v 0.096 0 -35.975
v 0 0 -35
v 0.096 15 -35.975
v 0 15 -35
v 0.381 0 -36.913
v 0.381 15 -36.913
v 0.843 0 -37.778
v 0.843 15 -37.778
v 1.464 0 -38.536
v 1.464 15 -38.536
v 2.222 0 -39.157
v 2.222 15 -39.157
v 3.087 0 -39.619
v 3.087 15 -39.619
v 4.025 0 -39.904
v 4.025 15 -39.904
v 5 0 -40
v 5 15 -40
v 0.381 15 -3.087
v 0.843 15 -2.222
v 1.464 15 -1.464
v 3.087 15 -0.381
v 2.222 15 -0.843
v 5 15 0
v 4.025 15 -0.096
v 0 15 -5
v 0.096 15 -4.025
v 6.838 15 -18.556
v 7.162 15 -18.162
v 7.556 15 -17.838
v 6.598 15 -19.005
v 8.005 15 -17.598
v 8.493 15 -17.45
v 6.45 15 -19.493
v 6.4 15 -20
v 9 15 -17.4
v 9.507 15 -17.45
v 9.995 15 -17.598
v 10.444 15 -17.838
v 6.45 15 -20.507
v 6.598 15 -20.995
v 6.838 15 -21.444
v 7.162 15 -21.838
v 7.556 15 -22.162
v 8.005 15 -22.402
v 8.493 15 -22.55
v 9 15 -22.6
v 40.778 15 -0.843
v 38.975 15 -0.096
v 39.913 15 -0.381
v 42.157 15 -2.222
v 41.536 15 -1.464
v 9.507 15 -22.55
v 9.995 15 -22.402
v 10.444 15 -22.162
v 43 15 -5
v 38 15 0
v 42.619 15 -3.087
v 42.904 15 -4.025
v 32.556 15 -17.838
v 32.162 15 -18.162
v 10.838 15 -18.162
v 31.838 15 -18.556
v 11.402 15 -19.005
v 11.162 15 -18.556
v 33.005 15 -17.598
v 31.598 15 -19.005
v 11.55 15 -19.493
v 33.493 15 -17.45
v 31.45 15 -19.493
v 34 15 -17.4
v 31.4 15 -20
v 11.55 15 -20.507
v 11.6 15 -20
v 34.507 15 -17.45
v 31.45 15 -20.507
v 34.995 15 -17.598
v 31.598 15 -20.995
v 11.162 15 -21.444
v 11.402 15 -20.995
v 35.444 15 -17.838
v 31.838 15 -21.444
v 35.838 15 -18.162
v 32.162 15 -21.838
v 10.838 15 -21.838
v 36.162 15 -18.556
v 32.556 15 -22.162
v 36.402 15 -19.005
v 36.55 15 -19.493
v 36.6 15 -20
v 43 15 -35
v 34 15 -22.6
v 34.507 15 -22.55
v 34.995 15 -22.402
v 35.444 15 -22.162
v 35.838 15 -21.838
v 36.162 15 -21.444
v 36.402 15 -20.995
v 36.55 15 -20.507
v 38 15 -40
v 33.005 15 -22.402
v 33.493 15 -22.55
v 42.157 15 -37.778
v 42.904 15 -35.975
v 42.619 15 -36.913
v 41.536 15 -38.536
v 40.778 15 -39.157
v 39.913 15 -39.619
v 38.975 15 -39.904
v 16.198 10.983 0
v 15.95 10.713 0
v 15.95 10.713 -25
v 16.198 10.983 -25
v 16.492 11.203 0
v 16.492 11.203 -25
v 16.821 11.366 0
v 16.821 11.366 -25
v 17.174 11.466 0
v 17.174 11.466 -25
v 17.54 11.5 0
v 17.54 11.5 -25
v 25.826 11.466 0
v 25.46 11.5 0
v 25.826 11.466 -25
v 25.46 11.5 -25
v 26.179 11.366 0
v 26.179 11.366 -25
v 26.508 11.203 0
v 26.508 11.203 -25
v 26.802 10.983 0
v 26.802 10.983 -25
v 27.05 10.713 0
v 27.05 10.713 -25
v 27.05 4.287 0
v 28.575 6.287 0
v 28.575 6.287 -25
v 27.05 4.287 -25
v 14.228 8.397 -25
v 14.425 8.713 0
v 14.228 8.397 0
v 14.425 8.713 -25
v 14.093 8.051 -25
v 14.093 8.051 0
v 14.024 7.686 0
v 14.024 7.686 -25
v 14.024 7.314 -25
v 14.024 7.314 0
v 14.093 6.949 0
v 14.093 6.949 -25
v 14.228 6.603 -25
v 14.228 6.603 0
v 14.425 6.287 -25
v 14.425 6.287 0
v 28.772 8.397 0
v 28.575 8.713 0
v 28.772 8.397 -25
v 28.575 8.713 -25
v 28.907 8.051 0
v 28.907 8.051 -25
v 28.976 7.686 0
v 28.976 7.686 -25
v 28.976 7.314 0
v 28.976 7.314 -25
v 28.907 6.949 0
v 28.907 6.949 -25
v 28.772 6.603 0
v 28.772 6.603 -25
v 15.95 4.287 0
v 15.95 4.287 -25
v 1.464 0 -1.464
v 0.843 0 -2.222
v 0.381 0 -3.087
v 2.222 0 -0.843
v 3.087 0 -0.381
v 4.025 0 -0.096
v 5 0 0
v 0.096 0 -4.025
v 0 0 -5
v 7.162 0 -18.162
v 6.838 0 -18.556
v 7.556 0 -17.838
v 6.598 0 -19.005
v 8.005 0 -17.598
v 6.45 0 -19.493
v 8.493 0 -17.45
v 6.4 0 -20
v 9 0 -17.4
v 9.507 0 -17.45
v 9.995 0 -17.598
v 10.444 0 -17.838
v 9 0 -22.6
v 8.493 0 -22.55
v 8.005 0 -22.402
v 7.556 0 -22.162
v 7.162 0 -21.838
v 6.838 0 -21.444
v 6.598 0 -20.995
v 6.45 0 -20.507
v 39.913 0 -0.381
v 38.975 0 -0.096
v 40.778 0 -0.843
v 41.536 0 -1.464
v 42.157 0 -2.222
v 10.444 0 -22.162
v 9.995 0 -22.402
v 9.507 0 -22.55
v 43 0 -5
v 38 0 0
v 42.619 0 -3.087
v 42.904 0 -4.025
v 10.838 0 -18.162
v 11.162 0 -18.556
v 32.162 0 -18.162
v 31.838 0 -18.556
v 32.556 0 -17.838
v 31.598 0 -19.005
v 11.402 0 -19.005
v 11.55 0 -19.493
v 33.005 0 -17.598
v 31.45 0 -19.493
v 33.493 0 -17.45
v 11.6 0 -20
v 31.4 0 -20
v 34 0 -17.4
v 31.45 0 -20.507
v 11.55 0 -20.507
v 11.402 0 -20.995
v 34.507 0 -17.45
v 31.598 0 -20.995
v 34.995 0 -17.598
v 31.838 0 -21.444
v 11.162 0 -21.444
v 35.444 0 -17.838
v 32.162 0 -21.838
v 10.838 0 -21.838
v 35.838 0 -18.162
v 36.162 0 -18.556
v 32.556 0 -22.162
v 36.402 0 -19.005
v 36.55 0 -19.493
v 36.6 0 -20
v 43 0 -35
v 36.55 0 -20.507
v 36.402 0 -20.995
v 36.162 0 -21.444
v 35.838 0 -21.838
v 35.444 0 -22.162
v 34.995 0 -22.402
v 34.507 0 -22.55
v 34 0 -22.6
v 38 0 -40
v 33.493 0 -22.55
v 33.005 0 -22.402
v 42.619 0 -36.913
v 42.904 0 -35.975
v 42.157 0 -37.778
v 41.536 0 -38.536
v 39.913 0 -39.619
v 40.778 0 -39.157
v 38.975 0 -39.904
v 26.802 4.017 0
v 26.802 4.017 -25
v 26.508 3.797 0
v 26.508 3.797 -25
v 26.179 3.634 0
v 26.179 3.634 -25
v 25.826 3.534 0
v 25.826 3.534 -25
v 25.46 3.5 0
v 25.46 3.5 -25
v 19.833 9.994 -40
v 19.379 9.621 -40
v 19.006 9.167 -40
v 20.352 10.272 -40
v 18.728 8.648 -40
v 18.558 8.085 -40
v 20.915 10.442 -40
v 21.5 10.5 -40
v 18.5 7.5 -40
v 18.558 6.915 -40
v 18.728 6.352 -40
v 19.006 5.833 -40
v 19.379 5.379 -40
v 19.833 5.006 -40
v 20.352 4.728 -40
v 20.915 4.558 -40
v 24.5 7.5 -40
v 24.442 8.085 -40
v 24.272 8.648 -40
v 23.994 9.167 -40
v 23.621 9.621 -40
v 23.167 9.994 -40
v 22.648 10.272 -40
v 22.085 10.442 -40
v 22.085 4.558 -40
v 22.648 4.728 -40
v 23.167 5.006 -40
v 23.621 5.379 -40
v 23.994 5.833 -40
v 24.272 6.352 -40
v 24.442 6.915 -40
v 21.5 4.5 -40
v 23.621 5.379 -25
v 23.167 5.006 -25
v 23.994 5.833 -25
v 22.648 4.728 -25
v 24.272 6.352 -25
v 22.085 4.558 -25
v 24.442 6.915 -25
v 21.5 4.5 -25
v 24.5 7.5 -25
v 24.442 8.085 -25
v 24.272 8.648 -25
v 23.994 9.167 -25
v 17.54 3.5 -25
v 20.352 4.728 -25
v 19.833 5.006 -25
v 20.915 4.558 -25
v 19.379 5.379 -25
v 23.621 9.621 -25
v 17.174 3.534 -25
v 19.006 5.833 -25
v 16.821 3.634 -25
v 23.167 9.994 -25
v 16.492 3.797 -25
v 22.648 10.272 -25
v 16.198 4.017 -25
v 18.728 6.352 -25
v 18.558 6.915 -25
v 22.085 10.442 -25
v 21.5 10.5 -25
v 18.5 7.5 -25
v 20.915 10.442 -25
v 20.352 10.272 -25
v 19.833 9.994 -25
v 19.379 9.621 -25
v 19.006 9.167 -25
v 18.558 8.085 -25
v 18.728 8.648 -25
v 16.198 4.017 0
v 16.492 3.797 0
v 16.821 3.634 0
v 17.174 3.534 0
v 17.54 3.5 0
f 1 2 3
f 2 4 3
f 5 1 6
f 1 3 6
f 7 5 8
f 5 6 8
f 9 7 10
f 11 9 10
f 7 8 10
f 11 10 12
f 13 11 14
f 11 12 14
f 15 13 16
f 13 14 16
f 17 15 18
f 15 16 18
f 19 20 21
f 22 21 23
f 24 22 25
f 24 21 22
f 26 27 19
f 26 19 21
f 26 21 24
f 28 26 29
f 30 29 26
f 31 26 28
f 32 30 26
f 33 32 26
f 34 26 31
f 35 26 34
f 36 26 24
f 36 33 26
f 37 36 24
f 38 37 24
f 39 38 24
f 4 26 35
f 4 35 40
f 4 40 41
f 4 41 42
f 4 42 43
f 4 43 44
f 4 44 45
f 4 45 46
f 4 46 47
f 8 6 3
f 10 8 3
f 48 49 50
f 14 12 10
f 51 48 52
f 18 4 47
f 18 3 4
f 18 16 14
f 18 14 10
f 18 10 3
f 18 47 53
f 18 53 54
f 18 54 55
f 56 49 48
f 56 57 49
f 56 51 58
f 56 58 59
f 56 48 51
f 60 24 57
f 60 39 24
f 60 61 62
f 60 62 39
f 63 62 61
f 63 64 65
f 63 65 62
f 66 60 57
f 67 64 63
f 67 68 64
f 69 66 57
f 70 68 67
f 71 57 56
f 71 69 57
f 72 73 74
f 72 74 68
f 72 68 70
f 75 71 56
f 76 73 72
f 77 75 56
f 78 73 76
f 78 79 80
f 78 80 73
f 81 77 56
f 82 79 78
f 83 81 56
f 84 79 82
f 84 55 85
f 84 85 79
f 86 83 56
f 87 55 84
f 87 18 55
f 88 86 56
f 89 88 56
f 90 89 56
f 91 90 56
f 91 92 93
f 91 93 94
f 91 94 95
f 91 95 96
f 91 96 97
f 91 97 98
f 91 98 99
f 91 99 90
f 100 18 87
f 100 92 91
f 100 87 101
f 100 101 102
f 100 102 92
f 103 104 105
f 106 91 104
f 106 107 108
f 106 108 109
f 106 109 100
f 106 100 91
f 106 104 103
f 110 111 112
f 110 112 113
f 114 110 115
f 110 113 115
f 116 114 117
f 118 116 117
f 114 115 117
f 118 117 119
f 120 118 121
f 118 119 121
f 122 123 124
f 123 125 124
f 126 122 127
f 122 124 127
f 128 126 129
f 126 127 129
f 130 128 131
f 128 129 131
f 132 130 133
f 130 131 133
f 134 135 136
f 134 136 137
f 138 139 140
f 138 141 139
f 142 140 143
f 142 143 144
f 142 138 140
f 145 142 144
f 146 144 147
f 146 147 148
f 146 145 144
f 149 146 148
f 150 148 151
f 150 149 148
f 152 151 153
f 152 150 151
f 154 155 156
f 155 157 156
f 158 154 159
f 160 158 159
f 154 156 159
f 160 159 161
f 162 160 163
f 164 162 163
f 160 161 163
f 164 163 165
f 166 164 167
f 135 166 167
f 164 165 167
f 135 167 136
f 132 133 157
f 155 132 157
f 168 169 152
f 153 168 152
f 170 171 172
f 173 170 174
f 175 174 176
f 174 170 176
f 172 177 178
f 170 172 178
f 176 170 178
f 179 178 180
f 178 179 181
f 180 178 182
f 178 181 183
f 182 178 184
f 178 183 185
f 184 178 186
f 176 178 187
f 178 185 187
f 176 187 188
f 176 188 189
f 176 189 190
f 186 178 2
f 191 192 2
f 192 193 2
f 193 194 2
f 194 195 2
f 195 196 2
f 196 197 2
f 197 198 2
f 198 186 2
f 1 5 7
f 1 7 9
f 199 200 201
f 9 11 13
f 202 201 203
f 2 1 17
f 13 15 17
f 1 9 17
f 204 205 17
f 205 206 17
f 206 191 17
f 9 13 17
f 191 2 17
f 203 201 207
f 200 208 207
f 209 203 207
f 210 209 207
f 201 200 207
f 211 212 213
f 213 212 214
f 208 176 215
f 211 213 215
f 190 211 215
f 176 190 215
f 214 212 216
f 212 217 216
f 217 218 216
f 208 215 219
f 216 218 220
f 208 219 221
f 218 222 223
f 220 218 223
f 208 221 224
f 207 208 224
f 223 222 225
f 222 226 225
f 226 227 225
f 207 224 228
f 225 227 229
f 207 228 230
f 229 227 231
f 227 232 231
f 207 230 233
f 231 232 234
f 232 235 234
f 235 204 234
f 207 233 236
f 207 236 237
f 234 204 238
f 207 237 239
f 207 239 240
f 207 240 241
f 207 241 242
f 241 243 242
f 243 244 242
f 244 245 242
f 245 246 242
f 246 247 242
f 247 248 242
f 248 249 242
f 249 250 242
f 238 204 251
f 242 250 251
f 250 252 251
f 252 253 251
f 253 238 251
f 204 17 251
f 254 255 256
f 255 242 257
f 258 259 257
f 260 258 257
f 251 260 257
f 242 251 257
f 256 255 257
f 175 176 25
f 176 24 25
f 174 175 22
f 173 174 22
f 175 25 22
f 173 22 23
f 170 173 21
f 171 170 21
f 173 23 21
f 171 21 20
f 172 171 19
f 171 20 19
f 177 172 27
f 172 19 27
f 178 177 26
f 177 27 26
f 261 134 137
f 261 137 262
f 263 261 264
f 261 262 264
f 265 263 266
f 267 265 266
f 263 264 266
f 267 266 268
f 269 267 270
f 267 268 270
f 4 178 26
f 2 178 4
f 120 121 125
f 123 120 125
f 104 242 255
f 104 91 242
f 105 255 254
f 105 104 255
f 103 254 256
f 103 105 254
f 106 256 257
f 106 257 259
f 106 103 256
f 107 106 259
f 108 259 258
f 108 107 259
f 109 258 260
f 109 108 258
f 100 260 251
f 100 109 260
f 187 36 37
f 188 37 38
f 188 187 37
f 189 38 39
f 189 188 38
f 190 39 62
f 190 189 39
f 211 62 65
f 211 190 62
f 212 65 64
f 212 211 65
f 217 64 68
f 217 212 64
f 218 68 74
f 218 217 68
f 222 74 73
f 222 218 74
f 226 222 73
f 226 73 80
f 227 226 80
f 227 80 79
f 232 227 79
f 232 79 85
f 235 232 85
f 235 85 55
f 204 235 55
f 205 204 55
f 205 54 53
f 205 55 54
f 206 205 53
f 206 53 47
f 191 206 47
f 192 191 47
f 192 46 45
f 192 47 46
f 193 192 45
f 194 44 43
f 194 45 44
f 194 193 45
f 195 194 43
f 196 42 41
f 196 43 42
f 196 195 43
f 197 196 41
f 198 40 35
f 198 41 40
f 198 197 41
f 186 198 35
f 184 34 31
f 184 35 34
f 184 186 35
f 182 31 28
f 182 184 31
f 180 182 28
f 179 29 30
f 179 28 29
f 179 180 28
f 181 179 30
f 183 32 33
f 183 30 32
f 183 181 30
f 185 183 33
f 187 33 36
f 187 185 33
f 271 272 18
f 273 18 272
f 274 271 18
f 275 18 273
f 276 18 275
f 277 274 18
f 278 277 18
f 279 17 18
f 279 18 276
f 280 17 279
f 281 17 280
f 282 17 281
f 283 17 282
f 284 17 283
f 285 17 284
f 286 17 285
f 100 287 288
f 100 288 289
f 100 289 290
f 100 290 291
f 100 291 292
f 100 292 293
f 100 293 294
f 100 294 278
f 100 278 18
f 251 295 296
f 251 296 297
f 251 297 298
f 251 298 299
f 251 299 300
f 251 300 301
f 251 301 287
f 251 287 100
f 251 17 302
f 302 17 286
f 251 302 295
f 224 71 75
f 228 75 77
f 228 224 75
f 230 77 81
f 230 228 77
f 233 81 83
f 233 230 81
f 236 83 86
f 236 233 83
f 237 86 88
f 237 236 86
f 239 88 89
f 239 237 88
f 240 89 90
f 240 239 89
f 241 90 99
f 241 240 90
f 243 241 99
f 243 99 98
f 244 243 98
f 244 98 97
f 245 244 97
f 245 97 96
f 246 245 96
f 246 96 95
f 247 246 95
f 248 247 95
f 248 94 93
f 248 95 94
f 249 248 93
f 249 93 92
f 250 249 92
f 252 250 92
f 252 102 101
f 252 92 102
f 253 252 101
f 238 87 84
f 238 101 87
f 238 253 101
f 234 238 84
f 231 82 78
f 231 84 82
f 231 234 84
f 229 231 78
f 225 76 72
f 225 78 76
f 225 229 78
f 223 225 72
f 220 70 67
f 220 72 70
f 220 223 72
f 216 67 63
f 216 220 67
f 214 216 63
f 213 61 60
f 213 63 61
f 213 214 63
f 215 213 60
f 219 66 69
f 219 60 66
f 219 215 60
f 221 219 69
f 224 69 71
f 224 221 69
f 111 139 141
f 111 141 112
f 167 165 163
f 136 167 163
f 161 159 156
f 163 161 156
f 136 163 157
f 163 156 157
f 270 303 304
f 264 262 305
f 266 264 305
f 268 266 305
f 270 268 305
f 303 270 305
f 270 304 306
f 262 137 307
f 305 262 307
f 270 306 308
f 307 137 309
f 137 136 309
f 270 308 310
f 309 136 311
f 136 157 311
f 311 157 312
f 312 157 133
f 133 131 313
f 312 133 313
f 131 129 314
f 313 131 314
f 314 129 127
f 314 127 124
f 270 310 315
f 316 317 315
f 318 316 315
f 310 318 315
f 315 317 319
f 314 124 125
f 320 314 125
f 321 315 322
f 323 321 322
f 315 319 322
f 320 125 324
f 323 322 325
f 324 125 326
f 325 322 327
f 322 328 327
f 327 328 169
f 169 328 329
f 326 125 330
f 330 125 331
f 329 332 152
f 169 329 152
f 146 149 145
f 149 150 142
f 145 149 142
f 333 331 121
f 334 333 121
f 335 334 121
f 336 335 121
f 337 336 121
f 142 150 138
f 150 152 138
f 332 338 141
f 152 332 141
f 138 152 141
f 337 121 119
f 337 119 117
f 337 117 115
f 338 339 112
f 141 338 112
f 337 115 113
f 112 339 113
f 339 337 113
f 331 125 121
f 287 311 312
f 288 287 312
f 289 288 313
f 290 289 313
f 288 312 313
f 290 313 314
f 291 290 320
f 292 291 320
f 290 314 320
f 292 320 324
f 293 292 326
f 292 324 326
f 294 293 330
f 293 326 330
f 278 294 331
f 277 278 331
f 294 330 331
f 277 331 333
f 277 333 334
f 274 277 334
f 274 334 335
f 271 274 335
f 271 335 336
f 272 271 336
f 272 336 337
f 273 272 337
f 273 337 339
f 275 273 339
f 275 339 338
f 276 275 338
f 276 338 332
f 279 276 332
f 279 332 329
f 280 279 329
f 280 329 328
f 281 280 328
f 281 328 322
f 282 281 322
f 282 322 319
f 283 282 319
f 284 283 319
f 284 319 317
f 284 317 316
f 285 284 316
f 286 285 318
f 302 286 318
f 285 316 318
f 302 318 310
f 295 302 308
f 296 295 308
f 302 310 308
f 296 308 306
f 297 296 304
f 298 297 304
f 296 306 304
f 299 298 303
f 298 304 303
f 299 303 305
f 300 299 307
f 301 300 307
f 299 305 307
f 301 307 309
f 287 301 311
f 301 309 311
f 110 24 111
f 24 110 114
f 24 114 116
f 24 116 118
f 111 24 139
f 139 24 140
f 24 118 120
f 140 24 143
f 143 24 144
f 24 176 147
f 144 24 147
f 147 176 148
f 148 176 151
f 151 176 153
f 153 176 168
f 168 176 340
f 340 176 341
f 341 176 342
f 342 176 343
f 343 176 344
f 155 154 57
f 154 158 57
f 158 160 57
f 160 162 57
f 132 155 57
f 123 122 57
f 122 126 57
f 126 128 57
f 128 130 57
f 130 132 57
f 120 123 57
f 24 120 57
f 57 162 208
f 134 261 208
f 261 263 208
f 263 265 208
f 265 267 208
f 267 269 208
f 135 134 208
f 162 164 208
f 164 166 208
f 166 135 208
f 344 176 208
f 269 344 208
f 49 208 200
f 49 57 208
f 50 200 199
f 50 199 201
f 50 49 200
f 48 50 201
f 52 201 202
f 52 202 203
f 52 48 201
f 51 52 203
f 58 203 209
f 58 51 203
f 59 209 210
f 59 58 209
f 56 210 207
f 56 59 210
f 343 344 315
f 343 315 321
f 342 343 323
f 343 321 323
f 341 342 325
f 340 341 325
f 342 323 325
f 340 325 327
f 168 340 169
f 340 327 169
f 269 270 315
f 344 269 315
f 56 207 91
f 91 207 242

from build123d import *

# Parameters (mm, degrees)
SKETCH1_W           = 43
SKETCH1_H           = 40
BOSS_EXTRUDE1_DEPTH = 15
CUT_EXTRUDE1_DEPTH  = 25
SKETCH3_R           = 3
CUT_EXTRUDE2_DEPTH  = 61.613529843
SKETCH4_R           = 2.6
CUT_EXTRUDE3_DEPTH  = 61.613529843
FILLET1_R           = 2
FILLET3_R           = 5


with BuildPart() as part:
    # Sketch1 → Boss-Extrude1 (new body)
    with BuildSketch(Plane(origin=(0, 0, 0), x_dir=(1, 0, 0), z_dir=(0, 1, 0))):
        with Locations((21.5, 20)):
            Rectangle(SKETCH1_W, SKETCH1_H)
    extrude(amount=BOSS_EXTRUDE1_DEPTH)

    # Sketch2 → Cut-Extrude1 (cut)
    with BuildSketch(Plane.XY):
        Polygon((13.5, 7.5), (16.55, 11.5), (26.45, 11.5), (29.5, 7.5), (26.45, 3.5), (16.55, 3.5), align=None)
    extrude(amount=-CUT_EXTRUDE1_DEPTH, mode=Mode.SUBTRACT)

    # Sketch3 → Cut-Extrude2 (cut, through all)
    with BuildSketch(Plane.XY):
        with Locations((21.5, 7.5)):
            Circle(SKETCH3_R)
    extrude(amount=-CUT_EXTRUDE2_DEPTH, mode=Mode.SUBTRACT)

    # Sketch4 → Cut-Extrude3 (cut, through all)
    with BuildSketch(Plane(origin=(0, 0, 0), x_dir=(1, 0, 0), z_dir=(0, 1, 0))):
        with Locations(Location((9, 20, 0), (0, 0, 270))):
            Circle(SKETCH4_R)
        with Locations(Location((34, 20, 0), (0, 0, 270))):
            Circle(SKETCH4_R)
    extrude(amount=CUT_EXTRUDE3_DEPTH, mode=Mode.SUBTRACT)

    # Fillet1
    fillet1_edges = [part.edges().sort_by_distance(p)[0] for p in [
        (16.55, 3.5, -12.5),
        (13.5, 7.5, -12.5),
        (16.55, 11.5, -12.5),
        (26.45, 11.5, -12.5),
        (29.5, 7.5, -12.5),
        (26.45, 3.5, -12.5),
    ]]
    fillet(fillet1_edges, radius=FILLET1_R)

    # Fillet3
    fillet3_edges = [part.edges().sort_by_distance(p)[0] for p in [
        (0, 7.5, -40),
        (43, 7.5, -40),
        (43, 7.5, 0),
        (0, 7.5, 0),
    ]]
    fillet(fillet3_edges, radius=FILLET3_R)


solid = part.part
